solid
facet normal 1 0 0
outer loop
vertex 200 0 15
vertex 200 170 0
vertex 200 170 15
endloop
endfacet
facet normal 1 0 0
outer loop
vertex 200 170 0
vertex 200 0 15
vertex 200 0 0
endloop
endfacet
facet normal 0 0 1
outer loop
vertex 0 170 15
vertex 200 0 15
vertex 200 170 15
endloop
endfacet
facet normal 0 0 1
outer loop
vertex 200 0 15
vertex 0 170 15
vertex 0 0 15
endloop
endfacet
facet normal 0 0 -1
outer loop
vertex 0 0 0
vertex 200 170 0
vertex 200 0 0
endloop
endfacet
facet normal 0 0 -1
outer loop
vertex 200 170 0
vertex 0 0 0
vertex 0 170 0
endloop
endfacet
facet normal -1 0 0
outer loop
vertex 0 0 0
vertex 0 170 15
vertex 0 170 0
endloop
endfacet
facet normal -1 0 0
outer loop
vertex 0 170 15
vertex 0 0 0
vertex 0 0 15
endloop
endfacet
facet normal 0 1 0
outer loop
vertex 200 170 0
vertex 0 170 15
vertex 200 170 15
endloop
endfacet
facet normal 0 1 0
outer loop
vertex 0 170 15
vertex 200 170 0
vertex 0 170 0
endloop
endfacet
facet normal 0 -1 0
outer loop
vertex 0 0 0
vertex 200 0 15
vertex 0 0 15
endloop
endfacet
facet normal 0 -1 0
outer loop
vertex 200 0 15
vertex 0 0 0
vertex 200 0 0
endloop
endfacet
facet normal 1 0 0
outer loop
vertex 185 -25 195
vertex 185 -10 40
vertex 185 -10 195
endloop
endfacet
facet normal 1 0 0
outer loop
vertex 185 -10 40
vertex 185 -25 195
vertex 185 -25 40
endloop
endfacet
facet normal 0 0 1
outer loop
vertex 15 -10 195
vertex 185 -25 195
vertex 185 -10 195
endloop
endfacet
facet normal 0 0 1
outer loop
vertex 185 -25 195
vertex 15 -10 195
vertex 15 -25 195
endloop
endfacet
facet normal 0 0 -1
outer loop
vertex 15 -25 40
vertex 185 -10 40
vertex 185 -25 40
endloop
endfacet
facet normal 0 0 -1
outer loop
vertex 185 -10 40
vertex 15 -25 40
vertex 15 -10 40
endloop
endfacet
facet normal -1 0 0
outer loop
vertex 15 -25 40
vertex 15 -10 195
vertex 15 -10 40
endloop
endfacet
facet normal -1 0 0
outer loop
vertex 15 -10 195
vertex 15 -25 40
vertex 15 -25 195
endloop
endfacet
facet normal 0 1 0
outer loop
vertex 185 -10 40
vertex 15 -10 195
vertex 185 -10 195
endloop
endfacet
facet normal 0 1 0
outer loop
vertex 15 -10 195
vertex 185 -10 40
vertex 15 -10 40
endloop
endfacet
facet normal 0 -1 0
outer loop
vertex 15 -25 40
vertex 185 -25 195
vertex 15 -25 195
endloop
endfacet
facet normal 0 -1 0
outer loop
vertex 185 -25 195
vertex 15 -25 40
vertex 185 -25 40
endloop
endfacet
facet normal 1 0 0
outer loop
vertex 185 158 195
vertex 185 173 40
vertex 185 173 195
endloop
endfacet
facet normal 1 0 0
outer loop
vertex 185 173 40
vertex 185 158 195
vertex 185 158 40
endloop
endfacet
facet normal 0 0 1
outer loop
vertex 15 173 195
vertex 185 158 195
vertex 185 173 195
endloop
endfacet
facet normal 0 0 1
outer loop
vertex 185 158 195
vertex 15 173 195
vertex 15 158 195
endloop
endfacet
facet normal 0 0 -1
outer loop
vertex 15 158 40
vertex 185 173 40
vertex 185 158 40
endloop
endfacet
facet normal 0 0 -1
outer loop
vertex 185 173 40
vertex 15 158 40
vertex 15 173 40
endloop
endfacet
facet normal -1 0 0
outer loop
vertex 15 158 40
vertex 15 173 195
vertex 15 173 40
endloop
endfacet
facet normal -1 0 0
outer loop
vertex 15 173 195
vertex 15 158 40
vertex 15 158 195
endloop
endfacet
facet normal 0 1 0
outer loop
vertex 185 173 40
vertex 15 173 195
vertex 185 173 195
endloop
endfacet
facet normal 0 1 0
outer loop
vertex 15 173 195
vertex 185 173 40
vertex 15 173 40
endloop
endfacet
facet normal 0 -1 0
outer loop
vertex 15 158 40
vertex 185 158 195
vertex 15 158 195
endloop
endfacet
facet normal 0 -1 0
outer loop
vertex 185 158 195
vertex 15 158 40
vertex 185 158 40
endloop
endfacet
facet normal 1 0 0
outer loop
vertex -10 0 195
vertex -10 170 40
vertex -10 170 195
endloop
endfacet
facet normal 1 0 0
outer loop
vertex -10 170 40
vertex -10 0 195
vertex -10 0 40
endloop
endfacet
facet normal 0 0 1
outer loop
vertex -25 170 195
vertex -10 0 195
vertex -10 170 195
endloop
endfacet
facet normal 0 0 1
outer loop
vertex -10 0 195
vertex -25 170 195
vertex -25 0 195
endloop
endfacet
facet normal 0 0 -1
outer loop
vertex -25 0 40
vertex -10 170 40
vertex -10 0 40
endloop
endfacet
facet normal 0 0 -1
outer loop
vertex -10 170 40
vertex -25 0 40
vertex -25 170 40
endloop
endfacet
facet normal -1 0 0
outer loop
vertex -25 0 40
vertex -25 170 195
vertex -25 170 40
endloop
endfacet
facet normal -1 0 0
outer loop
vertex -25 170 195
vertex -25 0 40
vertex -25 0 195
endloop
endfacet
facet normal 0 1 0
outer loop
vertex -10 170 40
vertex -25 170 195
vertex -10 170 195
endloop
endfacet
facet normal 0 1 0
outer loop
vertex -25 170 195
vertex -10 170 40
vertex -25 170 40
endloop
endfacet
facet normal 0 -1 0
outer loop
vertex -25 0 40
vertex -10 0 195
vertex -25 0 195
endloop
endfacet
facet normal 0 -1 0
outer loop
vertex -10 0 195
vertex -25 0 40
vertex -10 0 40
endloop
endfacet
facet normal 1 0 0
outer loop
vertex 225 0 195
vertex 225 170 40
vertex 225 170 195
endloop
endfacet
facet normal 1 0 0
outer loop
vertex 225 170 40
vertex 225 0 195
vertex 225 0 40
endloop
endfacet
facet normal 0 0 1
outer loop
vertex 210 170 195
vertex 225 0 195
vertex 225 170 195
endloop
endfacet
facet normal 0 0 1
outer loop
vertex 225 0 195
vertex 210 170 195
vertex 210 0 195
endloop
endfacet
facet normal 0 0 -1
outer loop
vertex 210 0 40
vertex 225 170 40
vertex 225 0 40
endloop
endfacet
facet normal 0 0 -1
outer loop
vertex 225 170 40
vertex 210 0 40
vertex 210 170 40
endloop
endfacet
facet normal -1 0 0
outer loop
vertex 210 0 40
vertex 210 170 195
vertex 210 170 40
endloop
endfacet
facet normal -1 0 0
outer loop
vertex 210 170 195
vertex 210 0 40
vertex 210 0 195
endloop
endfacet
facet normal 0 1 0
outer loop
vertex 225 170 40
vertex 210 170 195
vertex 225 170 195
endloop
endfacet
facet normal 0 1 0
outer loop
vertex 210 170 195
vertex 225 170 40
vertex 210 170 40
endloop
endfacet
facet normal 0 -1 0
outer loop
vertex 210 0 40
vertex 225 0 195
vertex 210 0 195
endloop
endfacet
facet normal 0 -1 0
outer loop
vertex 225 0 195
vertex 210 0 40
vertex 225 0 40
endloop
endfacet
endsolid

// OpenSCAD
$fn=100;

os=25;	// offset

union() {
	cube([200, 170, 15]);
	translate([15, -os, 15+os]) cube([170, 15, 155]);
	translate([15, 155-22+os, 15+os]) cube([170, 15, 155]);
	translate([-os, 0, 15+os]) cube([15, 170, 155]);
	translate([185+os, 0, 15+os]) cube([15, 170, 155]);
}
